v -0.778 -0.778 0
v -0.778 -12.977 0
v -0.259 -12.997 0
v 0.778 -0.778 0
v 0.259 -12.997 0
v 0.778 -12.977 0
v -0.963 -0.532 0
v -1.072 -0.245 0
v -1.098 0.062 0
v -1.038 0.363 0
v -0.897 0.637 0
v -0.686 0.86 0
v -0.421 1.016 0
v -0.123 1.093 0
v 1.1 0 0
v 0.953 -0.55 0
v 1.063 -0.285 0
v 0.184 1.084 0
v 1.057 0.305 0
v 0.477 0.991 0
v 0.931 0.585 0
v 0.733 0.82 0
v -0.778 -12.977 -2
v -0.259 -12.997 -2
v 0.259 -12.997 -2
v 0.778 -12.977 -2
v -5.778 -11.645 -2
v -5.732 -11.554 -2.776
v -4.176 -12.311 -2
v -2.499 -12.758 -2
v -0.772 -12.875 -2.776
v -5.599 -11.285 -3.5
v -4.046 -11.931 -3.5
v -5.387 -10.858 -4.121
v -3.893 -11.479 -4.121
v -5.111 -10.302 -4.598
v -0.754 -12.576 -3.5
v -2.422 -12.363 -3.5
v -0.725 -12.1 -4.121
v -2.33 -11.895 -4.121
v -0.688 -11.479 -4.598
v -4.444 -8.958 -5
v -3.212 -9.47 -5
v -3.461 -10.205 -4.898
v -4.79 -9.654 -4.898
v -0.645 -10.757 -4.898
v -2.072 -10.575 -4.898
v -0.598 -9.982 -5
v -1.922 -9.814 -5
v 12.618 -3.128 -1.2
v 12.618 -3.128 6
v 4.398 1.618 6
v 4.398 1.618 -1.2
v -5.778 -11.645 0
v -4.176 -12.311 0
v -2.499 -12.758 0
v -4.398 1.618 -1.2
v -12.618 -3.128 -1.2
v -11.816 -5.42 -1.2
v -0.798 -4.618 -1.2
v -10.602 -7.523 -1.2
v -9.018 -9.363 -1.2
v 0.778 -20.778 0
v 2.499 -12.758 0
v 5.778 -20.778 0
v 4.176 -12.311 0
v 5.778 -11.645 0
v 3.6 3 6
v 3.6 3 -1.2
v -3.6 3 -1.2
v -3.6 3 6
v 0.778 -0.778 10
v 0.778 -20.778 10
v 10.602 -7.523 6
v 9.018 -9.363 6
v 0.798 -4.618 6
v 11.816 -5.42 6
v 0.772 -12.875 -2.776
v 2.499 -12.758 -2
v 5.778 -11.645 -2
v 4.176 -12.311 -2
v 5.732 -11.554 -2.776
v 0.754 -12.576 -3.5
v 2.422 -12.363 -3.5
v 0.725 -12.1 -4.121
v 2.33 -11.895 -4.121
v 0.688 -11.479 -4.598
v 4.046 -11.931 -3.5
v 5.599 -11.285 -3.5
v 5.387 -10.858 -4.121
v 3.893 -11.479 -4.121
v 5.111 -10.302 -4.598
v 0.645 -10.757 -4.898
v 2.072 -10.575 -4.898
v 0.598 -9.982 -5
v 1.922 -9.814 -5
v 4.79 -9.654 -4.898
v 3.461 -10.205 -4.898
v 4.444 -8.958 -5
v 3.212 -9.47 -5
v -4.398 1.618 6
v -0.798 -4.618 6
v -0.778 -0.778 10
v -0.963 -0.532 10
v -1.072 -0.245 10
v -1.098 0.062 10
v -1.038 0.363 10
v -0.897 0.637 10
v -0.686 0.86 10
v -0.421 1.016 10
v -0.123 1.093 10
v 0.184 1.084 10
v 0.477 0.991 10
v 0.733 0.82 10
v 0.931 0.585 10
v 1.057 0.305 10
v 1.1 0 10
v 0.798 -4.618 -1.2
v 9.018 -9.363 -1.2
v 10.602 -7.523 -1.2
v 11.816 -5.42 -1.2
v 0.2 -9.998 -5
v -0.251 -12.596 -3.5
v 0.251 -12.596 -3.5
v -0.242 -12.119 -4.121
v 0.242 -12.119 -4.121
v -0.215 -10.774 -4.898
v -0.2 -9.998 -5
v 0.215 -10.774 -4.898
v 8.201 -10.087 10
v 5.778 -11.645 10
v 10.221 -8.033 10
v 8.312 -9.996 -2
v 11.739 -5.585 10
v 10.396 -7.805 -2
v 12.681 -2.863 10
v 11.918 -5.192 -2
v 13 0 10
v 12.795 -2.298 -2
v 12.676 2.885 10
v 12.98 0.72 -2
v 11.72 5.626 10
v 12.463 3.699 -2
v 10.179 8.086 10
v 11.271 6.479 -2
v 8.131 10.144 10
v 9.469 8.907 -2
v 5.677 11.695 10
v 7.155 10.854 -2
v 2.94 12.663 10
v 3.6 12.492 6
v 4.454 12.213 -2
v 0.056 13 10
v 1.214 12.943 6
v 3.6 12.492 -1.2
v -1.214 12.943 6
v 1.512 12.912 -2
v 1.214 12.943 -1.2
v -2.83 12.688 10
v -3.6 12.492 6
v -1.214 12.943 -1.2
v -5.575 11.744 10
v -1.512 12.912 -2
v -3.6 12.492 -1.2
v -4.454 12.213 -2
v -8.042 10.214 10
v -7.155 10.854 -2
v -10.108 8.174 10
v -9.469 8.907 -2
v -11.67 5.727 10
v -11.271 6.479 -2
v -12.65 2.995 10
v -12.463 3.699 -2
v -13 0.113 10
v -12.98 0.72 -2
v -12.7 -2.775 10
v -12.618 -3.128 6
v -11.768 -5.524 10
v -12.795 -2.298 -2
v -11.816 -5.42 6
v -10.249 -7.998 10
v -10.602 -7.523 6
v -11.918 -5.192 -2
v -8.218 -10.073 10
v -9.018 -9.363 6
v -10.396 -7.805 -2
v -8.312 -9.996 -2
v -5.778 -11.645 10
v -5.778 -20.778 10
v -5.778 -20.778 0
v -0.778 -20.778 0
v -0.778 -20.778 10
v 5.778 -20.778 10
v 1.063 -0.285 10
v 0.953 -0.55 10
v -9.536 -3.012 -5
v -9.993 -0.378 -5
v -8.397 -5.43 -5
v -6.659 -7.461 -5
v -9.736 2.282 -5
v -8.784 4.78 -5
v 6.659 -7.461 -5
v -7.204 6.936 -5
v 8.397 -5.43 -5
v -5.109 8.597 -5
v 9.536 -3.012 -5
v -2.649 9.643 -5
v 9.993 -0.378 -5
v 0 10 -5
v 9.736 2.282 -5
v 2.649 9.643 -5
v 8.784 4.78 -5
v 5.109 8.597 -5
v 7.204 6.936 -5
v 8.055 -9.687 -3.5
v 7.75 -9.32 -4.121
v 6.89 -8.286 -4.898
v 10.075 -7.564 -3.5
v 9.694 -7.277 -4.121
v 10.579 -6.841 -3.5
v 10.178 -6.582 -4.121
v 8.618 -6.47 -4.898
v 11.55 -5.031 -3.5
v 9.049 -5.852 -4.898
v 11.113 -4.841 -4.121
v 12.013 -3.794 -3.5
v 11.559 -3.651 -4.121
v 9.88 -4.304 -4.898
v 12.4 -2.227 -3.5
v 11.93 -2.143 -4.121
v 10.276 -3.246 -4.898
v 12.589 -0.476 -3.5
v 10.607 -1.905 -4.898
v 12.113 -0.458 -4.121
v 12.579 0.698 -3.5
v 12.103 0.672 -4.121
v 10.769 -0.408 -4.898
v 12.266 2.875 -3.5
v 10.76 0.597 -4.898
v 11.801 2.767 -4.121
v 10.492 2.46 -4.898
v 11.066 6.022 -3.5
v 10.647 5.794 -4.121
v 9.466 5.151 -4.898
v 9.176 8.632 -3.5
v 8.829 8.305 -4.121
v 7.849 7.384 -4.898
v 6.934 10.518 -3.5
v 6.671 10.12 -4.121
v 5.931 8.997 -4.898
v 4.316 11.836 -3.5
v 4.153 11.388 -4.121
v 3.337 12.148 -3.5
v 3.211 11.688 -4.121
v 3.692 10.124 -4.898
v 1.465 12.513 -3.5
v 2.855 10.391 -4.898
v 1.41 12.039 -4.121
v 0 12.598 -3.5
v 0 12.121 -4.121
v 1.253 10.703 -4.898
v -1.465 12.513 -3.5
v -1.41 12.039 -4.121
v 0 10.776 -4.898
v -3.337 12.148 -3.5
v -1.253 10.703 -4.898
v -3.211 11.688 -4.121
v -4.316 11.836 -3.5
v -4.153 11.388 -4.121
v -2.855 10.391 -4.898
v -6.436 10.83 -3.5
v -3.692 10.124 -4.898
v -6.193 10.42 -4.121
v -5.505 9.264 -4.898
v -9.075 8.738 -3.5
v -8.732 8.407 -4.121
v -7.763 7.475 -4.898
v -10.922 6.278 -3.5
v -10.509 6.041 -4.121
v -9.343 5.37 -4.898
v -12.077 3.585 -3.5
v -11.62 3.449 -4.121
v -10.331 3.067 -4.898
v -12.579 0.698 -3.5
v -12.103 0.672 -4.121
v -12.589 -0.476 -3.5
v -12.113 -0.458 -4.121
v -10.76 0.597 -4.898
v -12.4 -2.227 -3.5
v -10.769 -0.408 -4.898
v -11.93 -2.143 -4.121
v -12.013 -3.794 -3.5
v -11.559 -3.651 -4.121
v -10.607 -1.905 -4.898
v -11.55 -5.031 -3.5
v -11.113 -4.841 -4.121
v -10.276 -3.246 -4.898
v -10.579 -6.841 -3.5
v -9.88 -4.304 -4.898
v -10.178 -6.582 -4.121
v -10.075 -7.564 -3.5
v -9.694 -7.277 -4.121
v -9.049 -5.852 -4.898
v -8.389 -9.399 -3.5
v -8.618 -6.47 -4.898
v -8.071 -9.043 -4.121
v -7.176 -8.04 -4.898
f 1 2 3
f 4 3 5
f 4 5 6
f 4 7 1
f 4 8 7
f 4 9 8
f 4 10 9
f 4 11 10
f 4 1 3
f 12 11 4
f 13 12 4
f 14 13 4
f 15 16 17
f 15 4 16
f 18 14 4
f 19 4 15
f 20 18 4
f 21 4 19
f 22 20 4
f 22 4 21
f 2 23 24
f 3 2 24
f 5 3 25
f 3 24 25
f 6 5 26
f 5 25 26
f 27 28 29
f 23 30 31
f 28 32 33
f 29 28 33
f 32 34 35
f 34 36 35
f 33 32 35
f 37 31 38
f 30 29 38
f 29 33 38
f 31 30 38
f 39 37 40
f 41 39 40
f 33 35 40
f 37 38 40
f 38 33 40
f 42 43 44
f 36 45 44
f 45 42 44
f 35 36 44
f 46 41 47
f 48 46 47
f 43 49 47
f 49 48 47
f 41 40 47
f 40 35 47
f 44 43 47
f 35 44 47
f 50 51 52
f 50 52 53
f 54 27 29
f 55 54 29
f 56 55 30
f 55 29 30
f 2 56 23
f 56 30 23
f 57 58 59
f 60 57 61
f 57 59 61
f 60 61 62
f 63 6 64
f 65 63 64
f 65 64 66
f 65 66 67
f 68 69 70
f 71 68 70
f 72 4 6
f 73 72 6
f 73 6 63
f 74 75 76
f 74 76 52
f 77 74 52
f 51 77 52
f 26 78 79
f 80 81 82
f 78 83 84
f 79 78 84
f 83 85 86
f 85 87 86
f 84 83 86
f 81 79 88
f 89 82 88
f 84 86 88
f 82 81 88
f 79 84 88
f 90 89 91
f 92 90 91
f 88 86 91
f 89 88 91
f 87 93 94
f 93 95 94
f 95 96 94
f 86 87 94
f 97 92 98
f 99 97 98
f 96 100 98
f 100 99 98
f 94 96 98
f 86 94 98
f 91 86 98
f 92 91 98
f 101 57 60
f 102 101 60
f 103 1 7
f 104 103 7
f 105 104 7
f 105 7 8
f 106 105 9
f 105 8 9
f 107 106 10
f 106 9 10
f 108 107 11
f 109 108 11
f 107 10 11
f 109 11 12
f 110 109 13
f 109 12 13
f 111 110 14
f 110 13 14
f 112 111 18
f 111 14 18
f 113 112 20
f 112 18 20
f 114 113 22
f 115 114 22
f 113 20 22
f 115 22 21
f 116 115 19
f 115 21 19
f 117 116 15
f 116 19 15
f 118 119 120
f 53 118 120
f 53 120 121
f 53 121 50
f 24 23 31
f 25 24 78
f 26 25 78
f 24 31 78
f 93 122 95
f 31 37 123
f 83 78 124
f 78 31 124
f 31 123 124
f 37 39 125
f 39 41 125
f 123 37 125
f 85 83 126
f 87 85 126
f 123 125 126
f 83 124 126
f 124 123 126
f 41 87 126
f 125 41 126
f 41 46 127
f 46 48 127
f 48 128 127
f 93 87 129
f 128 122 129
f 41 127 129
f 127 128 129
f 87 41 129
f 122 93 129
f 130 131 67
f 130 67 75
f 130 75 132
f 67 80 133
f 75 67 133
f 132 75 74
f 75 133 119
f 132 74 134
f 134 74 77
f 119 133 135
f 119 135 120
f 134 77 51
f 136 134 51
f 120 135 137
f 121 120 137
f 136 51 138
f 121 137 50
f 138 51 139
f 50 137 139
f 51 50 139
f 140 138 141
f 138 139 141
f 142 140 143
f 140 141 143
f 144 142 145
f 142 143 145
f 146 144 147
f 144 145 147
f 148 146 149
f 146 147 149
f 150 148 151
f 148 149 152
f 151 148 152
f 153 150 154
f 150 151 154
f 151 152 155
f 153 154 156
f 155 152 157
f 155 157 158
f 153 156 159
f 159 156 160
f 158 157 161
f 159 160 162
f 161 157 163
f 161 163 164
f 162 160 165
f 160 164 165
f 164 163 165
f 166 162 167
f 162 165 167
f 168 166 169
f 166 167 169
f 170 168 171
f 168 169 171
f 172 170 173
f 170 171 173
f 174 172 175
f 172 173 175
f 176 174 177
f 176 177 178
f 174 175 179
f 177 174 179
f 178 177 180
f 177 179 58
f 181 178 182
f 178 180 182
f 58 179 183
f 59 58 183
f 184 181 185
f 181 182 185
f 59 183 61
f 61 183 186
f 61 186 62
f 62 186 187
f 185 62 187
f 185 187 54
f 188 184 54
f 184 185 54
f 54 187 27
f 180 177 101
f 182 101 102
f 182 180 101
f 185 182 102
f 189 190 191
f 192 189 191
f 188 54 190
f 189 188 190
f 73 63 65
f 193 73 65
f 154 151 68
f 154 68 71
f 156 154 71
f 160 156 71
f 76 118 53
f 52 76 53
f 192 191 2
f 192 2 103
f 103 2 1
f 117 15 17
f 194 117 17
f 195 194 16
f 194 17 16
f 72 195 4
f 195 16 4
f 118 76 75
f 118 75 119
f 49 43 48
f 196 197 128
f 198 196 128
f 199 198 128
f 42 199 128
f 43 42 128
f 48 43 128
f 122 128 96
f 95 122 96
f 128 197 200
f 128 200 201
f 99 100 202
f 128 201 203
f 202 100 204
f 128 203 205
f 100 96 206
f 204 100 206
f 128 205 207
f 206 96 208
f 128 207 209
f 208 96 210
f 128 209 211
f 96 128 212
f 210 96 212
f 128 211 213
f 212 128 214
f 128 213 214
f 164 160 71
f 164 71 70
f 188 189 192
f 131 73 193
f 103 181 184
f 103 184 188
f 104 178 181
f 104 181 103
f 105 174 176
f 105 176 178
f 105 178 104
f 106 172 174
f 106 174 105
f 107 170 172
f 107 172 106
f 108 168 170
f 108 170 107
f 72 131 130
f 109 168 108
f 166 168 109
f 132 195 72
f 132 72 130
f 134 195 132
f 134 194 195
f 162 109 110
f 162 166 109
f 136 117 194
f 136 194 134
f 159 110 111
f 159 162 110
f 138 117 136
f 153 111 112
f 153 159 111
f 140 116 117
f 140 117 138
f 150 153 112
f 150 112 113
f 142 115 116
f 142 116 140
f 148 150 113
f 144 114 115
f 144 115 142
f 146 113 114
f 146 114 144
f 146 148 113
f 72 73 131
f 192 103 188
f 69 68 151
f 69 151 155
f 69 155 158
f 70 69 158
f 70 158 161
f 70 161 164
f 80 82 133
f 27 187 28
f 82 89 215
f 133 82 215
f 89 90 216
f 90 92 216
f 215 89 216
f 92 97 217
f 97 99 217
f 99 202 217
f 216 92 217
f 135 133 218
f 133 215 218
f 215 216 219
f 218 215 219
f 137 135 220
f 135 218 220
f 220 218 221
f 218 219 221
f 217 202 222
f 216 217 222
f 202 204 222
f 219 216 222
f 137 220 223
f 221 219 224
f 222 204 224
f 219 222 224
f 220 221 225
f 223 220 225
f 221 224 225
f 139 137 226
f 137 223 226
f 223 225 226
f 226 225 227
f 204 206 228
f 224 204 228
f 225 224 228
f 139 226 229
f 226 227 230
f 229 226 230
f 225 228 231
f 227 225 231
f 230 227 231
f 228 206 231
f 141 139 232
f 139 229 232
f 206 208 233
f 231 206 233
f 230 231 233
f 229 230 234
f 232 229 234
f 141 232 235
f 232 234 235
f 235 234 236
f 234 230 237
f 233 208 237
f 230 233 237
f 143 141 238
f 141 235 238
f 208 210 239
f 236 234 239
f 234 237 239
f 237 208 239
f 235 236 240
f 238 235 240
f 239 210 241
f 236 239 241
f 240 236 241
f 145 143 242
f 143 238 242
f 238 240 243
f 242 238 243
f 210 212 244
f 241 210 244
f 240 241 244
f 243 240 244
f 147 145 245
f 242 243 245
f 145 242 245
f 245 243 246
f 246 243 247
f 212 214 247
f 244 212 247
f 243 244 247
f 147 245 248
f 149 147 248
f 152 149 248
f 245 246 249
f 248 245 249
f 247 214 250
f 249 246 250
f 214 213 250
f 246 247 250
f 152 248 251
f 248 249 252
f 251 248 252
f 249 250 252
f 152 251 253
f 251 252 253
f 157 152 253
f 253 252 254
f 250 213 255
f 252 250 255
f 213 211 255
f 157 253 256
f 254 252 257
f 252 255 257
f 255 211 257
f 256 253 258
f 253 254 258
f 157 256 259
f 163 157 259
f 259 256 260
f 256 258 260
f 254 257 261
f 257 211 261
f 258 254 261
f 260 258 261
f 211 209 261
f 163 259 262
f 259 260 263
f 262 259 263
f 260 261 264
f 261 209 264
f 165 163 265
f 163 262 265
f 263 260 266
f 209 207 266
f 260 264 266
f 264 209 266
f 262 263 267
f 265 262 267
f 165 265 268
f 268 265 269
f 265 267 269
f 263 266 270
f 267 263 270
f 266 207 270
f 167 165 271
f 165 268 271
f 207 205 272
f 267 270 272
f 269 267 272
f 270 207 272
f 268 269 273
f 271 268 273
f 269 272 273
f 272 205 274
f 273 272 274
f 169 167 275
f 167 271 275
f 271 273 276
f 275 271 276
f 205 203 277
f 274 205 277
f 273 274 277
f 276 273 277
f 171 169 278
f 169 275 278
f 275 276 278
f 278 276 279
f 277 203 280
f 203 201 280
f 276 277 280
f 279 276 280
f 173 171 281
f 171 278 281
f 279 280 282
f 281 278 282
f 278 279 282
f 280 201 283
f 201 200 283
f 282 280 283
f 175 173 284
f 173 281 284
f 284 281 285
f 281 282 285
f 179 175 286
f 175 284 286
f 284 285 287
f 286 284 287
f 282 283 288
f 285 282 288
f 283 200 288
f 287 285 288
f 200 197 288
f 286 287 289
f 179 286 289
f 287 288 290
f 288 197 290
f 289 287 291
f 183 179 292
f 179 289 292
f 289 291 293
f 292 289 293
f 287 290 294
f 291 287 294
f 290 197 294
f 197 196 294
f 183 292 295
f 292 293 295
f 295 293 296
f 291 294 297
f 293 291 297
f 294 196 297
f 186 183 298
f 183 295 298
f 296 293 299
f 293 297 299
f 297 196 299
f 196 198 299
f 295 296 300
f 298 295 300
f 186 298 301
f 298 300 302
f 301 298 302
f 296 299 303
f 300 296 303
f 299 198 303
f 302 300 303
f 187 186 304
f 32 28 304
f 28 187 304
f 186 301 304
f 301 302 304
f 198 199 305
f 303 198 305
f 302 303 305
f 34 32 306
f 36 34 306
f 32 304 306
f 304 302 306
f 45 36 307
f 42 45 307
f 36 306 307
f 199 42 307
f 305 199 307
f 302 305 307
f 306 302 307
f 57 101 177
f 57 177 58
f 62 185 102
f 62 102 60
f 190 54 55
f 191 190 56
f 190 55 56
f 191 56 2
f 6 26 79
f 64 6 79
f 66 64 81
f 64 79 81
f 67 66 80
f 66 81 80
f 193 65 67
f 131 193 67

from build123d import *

# Parameters (mm, degrees)
BOSS_EXTRUDE1_DEPTH = 10
BOSS_EXTRUDE2_START = -5
SKETCH1_4_R         = 13
BOSS_EXTRUDE2_DEPTH = 5
FILLET1_R           = 3
SKETCH4_W           = 7.2
SKETCH4_H           = 7.2
CUT_EXTRUDE1_DEPTH  = 10
CIRPATTERN1_COUNT   = 3


with BuildPart() as part:
    # Sketch1 → Boss-Extrude1 (new body)
    with BuildSketch(Plane.XY):
        with BuildLine():
            Line((-5.777817459, -20.777817459), (-0.777817459, -20.777817459))
            Line((-0.777817459, -20.777817459), (-0.777817459, -0.777817459))
            ThreePointArc((-0.777817459, -0.777817459), (0, 1.1), (0.777817459, -0.777817459))
            Line((0.777817459, -0.777817459), (0.777817459, -20.777817459))
            Line((0.777817459, -20.777817459), (5.777817459, -20.777817459))
            Line((5.777817459, -20.777817459), (5.777817459, -11.645463727))
            ThreePointArc((5.777817459, -11.645463727), (0, 13), (-5.777817459, -11.645463727))
            Line((-5.777817459, -11.645463727), (-5.777817459, -20.777817459))
        make_face()
    extrude(amount=BOSS_EXTRUDE1_DEPTH)

    # Sketch1<4> → Boss-Extrude2 (add)
    with BuildSketch(Plane.XY.offset(BOSS_EXTRUDE2_START)):
        Circle(SKETCH1_4_R)
    extrude(amount=BOSS_EXTRUDE2_DEPTH)

    # Fillet1
    fillet1_edges = [part.edges().sort_by_distance(p)[0] for p in [
        (-13, 0, -5),
    ]]
    fillet(fillet1_edges, radius=FILLET1_R)

    # Sketch4 → Cut-Extrude1 (cut)
    with BuildSketch(Plane(origin=(-11.286443879, -6.451305765, 0), x_dir=(0.499999999999998, -0.8660254037844398, 0), z_dir=(0.8660254037844398, 0.499999999999998, 0))):
        with Locations((0.056227259, -2.4)):
            Rectangle(SKETCH4_W, SKETCH4_H)
    cut_extrude1 = extrude(amount=CUT_EXTRUDE1_DEPTH, mode=Mode.SUBTRACT)

    # CirPattern1: Cut-Extrude1 ×3 about axis
    cirpattern1_axis = Axis((0, 0, 10), (0, 0, -1))
    for i in range(1, CIRPATTERN1_COUNT):
        add(cut_extrude1.rotate(cirpattern1_axis, i * 360 / CIRPATTERN1_COUNT), mode=Mode.SUBTRACT)


solid = part.part
